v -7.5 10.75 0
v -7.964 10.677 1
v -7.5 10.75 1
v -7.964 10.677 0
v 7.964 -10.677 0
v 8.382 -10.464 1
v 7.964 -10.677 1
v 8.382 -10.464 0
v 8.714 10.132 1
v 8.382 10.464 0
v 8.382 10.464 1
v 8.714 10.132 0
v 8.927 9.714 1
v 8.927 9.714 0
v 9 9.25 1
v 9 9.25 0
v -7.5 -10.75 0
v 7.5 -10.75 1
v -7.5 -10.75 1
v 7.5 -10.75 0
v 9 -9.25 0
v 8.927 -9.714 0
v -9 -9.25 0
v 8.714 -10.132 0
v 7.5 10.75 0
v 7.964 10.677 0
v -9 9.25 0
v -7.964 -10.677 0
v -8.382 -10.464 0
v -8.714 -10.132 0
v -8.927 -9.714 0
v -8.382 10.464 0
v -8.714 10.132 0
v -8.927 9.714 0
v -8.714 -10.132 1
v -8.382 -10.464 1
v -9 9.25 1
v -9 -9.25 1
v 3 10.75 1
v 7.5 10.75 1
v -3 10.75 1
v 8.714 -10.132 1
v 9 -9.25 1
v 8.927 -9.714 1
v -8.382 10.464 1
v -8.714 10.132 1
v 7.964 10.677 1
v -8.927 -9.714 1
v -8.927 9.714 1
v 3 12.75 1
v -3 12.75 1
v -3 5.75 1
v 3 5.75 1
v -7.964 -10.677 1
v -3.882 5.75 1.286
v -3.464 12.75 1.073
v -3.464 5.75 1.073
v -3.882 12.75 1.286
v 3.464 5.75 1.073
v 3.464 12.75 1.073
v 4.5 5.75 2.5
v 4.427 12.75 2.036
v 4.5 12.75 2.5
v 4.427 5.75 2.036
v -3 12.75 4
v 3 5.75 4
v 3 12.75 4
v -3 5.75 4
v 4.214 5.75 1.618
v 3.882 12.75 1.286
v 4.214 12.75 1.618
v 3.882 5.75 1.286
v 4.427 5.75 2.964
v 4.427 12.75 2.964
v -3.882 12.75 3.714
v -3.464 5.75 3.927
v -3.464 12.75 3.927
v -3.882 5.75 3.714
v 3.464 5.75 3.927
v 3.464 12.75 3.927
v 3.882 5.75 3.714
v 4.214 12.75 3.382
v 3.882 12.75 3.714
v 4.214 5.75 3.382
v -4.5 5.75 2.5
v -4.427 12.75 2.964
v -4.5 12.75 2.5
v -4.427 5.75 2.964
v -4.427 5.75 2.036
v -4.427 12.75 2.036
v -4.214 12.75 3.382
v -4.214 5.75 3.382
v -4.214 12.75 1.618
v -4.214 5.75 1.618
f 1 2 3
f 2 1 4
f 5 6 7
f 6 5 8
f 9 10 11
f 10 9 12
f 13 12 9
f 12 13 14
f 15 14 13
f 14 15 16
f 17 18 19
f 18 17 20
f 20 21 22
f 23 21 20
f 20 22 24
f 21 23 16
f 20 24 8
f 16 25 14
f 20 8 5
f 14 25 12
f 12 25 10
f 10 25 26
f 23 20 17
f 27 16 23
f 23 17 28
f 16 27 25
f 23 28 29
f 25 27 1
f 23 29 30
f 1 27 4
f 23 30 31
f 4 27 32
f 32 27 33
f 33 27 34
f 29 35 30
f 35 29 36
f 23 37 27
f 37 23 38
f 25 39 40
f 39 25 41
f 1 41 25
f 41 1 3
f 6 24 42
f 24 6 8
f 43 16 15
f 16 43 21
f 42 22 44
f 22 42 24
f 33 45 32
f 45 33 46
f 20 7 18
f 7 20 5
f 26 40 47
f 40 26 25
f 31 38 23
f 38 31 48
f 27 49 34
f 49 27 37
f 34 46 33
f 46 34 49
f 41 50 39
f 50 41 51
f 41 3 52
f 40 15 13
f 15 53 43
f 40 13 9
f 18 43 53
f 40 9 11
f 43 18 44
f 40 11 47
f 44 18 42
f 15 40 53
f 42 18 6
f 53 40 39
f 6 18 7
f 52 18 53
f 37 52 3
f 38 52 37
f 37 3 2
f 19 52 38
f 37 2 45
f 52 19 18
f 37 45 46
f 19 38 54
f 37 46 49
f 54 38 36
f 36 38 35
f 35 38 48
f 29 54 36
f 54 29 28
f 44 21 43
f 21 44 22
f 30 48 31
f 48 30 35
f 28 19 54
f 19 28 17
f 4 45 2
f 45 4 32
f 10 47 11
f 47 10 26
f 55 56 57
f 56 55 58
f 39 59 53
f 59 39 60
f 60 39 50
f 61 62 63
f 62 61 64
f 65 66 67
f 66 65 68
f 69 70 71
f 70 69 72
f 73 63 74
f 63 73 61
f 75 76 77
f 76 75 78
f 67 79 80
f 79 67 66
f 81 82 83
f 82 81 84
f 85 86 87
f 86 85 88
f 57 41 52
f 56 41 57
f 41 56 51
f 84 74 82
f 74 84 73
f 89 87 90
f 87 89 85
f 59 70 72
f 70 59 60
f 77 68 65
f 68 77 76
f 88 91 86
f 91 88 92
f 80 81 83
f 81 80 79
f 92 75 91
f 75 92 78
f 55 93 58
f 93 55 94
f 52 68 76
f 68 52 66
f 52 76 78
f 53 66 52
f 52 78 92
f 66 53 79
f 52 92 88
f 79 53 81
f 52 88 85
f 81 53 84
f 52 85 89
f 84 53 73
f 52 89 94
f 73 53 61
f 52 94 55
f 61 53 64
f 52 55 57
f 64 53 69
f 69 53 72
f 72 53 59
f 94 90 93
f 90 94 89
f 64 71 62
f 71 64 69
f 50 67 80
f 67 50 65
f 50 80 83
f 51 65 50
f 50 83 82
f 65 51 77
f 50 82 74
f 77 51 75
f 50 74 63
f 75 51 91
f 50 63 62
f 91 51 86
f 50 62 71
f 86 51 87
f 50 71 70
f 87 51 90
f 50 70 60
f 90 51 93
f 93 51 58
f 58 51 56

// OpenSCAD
board_w=18;
board_l=21.5;
board_th=1;

conn_h=3;
conn_w=9;
conn_l=7;

conn_overhang=2;
corner_r=1.5;

module seeed_xiao_esp32c3() {
    union() {
        color("black") hull() {
            for(extra_w=[0,board_w-corner_r*2]) {
                for (extra_l=[0,board_l-corner_r*2]) {
                    translate([-board_w/2+corner_r+extra_w,-board_l/2+corner_r+extra_l,0])
                    cylinder(h=board_th,r=corner_r,$fn=20);
                }
            }
        }
        color("silver") hull() {
            for(extra_w=[0,conn_w-conn_h])
            translate([-conn_w/2+conn_h/2+extra_w,board_l/2-conn_l+conn_overhang,board_th+conn_h/2])
            rotate([-90,0,0])
            cylinder(h=conn_l,d=conn_h,$fn=20);

        }
    }
}

seeed_xiao_esp32c3();
